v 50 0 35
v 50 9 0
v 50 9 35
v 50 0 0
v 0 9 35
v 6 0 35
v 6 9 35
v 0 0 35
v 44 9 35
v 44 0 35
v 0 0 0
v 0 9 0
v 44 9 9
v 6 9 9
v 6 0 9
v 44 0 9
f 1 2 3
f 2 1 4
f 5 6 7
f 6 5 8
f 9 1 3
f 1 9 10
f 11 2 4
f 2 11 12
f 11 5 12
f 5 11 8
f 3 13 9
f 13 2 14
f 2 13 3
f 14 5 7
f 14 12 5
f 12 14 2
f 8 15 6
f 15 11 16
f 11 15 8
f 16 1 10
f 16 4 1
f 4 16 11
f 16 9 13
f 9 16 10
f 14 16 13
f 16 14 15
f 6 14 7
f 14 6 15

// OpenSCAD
// violin limiter

insert_height = 9;

base_width = 50;
base_depth = insert_height;
base_height = 35;



cutout_width = 38;

x_offset = 0.5*(base_width - cutout_width);

difference() {
cube([base_width, base_depth, base_height]);
translate([x_offset, 0, insert_height]) cube([cutout_width, base_depth, base_height]);
}
